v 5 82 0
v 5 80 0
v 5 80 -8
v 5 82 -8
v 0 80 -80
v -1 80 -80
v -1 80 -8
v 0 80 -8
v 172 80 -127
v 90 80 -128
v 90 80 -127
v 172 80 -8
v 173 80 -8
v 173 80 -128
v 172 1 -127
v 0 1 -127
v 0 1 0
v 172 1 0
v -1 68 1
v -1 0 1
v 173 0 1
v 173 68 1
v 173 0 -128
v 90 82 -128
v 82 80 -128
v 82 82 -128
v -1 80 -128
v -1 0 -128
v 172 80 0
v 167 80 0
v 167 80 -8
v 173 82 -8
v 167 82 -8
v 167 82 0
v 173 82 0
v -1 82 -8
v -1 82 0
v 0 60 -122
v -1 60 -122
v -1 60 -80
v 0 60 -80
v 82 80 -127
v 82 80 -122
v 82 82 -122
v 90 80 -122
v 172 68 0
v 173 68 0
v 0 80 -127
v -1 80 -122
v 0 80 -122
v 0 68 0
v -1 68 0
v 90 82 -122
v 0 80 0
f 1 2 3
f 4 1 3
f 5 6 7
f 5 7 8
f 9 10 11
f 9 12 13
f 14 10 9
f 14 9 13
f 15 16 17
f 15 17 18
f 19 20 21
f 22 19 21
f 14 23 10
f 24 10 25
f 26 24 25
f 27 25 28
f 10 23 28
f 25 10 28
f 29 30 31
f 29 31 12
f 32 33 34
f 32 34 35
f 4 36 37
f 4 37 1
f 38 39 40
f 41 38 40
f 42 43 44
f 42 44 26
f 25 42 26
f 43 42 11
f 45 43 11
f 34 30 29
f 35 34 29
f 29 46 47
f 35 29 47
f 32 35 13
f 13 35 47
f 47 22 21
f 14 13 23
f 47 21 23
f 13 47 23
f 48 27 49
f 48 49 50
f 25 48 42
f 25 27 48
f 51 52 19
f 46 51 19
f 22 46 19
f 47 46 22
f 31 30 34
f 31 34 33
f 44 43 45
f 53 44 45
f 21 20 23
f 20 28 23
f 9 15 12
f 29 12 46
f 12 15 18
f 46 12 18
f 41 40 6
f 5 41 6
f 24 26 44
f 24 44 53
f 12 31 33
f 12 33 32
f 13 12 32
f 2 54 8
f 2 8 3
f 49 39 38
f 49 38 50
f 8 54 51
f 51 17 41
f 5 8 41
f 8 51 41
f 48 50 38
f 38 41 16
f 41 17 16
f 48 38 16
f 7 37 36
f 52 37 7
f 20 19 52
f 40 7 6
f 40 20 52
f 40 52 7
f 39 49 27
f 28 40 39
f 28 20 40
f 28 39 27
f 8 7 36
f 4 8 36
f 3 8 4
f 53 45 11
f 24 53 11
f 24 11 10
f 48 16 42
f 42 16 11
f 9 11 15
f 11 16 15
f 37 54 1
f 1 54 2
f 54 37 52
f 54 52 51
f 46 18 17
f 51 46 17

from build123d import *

# Parameters (mm, degrees)
SKETCH1_W           = 172
SKETCH1_H           = 127
BOSS_EXTRUDE1_DEPTH = 1
BOSS_EXTRUDE2_DEPTH = 80
BOSS_EXTRUDE3_DEPTH = 68
SKETCH4_W           = 6
SKETCH4_H           = 8
SKETCH4_W_2         = 8
SKETCH4_H_2         = 6
BOSS_EXTRUDE4_DEPTH = 2
SKETCH5_W           = 42
SKETCH5_H           = 20
CUT_EXTRUDE1_DEPTH  = 10


with BuildPart() as part:
    # Sketch1 → Boss-Extrude1 (new body)
    with BuildSketch(Plane(origin=(0, 0, 0), x_dir=(1, 0, 0), z_dir=(0, 1, 0))):
        with Locations((86, 63.5)):
            Rectangle(SKETCH1_W, SKETCH1_H)
    extrude(amount=BOSS_EXTRUDE1_DEPTH)

    # Sketch1<3> → Boss-Extrude2 (add)
    with BuildSketch(Plane(origin=(0, 0, 0), x_dir=(1, 0, 0), z_dir=(0, 1, 0))):
        Polygon((-1, 128), (-1, 0), (0, 0), (0, 127), (172, 127), (172, 0), (173, 0), (173, 128), align=None)
    extrude(amount=BOSS_EXTRUDE2_DEPTH)

    # Sketch1<4> → Boss-Extrude3 (add)
    with BuildSketch(Plane(origin=(0, 0, 0), x_dir=(1, 0, 0), z_dir=(0, 1, 0))):
        Polygon((-1, 0), (-1, -1), (173, -1), (173, 0), (172, 0), (0, 0), align=None)
    extrude(amount=BOSS_EXTRUDE3_DEPTH)

    # Sketch4 → Boss-Extrude4 (add)
    with BuildSketch(Plane(origin=(0, 80, 0), x_dir=(1, 0, 0), z_dir=(0, 1, 0))):
        with Locations((2, 4)):
            Rectangle(SKETCH4_W, SKETCH4_H)
        with Locations((170, 4)):
            Rectangle(SKETCH4_W, SKETCH4_H)
        with Locations((86, 125)):
            Rectangle(SKETCH4_W_2, SKETCH4_H_2)
    extrude(amount=BOSS_EXTRUDE4_DEPTH)

    # Sketch5 → Cut-Extrude1 (cut)
    with BuildSketch(Plane.ZY.offset(1)):
        with Locations((-101, 70)):
            Rectangle(SKETCH5_W, SKETCH5_H)
    extrude(amount=-CUT_EXTRUDE1_DEPTH, mode=Mode.SUBTRACT)


solid = part.part
